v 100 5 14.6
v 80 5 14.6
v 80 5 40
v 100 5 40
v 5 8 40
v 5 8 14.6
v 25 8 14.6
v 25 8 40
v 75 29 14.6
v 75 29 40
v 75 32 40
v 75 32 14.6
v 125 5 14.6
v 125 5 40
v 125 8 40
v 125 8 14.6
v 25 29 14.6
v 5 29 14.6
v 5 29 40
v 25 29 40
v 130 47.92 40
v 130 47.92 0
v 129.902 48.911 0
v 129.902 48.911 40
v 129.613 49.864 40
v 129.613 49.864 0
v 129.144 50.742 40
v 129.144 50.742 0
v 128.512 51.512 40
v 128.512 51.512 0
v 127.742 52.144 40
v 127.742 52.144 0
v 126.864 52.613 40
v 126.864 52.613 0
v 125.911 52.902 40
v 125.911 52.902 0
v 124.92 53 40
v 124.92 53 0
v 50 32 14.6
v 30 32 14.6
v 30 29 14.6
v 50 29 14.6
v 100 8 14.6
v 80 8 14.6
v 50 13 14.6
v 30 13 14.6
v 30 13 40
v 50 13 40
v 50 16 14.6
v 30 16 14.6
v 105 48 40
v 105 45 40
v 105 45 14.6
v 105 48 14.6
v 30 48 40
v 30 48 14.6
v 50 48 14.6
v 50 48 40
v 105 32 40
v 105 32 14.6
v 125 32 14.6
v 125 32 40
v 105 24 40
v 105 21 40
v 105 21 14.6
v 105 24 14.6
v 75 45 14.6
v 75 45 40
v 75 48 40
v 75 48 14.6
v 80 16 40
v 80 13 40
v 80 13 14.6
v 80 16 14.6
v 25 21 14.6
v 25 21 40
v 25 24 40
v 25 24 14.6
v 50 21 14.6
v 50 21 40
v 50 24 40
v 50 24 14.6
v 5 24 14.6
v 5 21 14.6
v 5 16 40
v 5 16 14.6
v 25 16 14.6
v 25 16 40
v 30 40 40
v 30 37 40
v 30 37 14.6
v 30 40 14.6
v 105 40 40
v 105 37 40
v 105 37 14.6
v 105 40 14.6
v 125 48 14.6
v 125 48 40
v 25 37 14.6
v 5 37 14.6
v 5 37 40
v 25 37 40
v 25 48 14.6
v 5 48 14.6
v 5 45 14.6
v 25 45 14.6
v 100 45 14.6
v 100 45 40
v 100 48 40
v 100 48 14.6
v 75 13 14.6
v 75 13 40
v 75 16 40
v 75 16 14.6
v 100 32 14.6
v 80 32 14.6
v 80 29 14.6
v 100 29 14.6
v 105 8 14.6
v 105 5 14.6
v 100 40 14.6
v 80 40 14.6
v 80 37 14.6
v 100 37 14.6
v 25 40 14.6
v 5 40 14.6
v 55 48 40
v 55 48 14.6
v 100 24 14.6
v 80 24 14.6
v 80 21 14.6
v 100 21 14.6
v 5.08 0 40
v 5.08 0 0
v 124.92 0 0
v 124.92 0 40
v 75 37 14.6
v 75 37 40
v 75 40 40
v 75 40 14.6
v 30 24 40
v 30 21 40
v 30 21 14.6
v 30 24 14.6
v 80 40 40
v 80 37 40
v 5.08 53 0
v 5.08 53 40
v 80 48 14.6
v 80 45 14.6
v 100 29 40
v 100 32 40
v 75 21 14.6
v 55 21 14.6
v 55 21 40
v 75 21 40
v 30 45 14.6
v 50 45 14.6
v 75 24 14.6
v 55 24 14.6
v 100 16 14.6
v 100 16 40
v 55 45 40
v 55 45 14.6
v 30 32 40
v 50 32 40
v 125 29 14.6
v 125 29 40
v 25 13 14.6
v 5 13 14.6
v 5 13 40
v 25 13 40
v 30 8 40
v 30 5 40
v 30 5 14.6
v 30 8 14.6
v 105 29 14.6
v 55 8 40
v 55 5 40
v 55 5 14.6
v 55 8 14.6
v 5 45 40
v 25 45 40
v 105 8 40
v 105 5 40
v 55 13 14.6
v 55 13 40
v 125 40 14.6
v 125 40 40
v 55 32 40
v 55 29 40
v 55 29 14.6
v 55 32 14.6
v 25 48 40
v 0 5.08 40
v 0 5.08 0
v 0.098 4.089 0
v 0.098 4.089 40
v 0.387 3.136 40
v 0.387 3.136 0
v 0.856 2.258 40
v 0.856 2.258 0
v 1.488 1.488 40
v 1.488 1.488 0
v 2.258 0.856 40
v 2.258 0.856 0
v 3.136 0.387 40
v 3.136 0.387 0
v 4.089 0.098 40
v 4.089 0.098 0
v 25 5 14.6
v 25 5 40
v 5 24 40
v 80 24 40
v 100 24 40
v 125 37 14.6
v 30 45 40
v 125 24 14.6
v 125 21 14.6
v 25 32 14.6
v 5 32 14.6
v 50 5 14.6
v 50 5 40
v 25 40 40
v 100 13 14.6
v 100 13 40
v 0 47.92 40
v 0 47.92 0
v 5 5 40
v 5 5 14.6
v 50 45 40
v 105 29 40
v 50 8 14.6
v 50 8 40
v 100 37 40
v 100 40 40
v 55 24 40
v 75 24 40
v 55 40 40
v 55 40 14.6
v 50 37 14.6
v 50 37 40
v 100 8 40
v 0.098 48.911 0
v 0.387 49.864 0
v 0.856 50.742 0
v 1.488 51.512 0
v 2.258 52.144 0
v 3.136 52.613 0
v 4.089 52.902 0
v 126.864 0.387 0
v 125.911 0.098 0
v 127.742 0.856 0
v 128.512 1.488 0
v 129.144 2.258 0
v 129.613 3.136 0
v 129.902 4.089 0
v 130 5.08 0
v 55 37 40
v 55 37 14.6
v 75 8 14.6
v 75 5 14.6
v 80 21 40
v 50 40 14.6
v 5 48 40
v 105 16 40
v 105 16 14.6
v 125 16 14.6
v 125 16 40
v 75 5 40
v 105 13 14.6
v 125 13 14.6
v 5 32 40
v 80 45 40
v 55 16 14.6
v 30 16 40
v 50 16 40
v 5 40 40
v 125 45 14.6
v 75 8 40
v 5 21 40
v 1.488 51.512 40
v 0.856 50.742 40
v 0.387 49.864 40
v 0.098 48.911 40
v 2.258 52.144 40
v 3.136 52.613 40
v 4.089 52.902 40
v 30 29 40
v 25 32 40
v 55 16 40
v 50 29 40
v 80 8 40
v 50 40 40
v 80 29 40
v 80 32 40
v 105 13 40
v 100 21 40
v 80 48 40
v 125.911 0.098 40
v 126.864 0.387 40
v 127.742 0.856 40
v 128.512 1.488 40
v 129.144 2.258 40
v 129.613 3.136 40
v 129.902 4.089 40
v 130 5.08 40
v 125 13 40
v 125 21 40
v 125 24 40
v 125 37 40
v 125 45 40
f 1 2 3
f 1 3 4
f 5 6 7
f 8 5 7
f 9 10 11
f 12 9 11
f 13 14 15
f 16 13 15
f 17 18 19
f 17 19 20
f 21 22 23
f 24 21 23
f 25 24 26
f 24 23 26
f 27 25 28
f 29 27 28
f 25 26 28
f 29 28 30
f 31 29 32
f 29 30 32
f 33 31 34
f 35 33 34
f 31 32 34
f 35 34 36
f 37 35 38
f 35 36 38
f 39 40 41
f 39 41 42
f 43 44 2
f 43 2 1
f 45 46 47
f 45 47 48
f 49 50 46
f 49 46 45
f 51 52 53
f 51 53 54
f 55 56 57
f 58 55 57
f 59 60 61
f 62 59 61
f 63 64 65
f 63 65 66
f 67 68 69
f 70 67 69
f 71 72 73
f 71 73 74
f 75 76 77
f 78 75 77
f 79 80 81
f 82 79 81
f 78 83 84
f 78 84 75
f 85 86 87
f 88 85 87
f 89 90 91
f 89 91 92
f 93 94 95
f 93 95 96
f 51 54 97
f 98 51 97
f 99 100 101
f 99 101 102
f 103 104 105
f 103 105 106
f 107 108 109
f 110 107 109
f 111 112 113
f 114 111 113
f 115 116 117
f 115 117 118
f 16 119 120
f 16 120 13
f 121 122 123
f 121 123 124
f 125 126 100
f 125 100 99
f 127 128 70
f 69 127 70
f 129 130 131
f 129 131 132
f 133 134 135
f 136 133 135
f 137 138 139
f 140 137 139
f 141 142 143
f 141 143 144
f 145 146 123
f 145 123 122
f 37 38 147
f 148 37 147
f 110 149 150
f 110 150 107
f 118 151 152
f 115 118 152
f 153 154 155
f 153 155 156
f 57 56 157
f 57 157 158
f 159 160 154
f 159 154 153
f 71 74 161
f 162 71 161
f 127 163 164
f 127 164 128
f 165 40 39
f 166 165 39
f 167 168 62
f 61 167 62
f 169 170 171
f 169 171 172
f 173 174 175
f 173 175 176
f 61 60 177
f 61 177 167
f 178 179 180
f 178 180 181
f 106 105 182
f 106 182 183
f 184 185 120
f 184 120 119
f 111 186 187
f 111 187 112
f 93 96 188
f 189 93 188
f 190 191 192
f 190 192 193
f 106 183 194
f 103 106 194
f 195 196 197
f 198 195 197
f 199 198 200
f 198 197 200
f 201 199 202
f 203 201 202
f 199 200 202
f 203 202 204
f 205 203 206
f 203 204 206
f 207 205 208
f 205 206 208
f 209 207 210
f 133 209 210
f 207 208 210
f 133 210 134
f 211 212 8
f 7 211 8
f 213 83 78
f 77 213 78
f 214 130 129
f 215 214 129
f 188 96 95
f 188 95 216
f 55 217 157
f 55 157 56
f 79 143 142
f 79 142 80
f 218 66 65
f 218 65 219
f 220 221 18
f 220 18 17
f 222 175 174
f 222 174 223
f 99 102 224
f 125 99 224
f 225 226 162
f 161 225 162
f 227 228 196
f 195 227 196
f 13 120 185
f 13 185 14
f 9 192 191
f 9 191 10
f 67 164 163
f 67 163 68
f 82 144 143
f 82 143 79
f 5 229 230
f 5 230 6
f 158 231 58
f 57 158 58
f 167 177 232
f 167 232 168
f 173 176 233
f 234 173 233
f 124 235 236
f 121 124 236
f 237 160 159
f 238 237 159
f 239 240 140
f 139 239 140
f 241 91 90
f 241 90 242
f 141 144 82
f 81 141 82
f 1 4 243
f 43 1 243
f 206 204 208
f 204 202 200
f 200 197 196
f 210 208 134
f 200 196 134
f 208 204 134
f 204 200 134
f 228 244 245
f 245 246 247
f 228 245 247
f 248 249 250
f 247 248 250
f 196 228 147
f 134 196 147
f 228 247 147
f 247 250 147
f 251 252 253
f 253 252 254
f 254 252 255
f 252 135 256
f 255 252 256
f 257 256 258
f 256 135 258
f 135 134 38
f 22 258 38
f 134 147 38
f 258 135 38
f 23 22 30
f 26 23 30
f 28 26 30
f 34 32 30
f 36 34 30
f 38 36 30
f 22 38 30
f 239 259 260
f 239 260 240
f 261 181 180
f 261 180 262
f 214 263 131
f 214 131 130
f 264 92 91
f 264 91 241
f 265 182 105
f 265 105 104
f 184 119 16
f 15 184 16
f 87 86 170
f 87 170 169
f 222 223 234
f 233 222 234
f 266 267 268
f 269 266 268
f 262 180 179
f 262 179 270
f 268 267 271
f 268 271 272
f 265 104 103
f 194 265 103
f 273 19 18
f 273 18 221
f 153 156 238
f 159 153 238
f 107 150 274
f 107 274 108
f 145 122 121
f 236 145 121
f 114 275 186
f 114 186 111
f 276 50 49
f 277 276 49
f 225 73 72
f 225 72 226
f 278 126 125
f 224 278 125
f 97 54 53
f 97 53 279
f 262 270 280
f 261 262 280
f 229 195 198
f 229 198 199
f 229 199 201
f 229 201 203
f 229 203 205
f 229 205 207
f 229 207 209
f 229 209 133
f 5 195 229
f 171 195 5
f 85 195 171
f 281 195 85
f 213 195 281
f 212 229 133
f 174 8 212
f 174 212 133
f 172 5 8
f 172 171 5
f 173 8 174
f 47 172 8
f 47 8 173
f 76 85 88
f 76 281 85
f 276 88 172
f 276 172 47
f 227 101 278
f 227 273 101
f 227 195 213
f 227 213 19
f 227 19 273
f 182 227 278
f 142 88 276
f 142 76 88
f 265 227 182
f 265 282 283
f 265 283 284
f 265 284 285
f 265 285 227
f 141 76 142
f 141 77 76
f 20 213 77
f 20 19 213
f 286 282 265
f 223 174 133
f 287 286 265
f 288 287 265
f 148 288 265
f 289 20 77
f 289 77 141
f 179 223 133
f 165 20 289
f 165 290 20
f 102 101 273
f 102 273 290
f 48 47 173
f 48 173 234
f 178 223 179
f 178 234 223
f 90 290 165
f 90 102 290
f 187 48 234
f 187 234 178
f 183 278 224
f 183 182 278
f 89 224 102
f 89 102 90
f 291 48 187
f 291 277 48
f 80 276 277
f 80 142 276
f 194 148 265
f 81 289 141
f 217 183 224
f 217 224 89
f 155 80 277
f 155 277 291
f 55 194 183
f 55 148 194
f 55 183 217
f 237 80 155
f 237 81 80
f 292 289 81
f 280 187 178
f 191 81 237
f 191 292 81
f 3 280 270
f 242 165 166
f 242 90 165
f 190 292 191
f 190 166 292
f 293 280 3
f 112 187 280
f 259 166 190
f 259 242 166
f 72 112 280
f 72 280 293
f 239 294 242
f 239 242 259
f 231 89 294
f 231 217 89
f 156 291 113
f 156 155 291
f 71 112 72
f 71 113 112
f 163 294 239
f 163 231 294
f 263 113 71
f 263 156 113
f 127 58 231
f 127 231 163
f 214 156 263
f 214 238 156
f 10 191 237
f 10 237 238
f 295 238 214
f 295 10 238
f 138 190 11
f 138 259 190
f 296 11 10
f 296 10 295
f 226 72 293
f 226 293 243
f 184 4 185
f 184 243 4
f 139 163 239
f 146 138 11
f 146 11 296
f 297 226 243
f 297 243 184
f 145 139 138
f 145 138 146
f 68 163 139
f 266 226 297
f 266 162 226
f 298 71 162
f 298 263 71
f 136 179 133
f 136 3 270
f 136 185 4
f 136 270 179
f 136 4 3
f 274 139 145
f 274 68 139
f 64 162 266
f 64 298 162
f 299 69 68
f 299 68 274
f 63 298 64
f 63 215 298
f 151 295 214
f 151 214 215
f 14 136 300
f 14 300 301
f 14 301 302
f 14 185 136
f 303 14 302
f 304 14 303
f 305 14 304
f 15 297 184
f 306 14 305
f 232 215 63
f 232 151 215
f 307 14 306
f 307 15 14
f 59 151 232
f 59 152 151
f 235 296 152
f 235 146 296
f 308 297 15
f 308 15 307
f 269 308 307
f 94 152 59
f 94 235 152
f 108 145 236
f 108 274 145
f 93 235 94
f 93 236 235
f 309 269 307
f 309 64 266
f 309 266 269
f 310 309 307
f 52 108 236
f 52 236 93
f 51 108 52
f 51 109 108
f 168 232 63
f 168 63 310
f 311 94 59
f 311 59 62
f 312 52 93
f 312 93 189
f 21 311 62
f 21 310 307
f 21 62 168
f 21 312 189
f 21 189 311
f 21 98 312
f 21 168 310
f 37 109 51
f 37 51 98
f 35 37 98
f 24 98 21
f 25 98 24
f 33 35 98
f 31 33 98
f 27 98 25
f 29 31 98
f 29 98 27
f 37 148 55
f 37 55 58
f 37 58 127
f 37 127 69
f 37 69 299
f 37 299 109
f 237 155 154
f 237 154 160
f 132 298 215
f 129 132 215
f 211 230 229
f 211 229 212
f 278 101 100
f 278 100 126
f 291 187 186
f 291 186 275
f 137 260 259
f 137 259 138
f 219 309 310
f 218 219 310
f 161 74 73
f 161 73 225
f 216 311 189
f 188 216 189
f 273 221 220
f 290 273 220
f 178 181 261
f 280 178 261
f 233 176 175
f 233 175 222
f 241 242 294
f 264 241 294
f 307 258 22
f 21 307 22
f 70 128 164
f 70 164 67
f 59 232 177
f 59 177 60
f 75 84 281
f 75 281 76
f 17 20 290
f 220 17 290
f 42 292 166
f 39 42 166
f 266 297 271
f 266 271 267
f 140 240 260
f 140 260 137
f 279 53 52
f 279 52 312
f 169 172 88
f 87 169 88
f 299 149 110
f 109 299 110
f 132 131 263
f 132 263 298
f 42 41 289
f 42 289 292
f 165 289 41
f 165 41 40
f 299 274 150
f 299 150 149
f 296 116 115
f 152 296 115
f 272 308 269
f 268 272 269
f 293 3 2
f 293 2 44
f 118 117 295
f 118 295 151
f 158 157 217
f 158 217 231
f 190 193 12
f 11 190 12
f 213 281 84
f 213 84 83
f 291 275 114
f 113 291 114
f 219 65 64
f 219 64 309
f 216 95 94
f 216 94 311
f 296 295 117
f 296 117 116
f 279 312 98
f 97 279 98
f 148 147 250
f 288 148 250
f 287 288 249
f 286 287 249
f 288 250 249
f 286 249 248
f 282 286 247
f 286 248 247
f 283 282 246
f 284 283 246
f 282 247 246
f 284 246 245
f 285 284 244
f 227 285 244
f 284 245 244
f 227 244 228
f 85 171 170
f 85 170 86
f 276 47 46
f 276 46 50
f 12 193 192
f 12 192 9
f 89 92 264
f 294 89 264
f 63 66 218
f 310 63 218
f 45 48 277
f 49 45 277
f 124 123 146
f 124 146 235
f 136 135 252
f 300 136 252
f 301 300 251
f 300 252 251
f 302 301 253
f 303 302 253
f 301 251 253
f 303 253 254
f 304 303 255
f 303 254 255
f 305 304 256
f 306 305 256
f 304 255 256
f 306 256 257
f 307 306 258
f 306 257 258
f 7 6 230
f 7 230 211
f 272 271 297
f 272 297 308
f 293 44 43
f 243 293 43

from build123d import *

# Parameters (mm, degrees)
F1_DEPTH = 40
F2_W     = 20
F2_H     = 3
F3_DEPTH = 25.4


with BuildPart() as f1:
    # F0 (on Top) → F1 (new body)
    with BuildSketch(Plane.XY):
        with BuildLine():
            ThreePointArc((0, 5.08), (1.487898, 1.487898), (5.08, 0))
            Line((5.08, 0), (124.92, 0))
            ThreePointArc((124.92, 0), (128.512102, 1.487898), (130, 5.08))
            Line((130, 5.08), (130, 47.92))
            ThreePointArc((130, 47.92), (128.512102, 51.512102), (124.92, 53))
            Line((124.92, 53), (5.08, 53))
            ThreePointArc((5.08, 53), (1.487898, 51.512102), (0, 47.92))
            Line((0, 47.92), (0, 5.08))
        make_face()
    extrude(amount=F1_DEPTH)

    # F2 (on face) → F3 (cut)
    with BuildSketch(Plane.XY.offset(40)):
        with Locations((15, 46.5)):
            Rectangle(F2_W, F2_H)
        with Locations((15, 38.5)):
            Rectangle(F2_W, F2_H)
        with Locations((15, 30.5)):
            Rectangle(F2_W, F2_H)
        with Locations((15, 22.5)):
            Rectangle(F2_W, F2_H)
        with Locations((15, 14.5)):
            Rectangle(F2_W, F2_H)
        with Locations((15, 6.5)):
            Rectangle(F2_W, F2_H)
        with Locations((40, 46.5)):
            Rectangle(F2_W, F2_H)
        with Locations((40, 38.5)):
            Rectangle(F2_W, F2_H)
        with Locations((40, 30.5)):
            Rectangle(F2_W, F2_H)
        with Locations((40, 22.5)):
            Rectangle(F2_W, F2_H)
        with Locations((40, 14.5)):
            Rectangle(F2_W, F2_H)
        with Locations((40, 6.5)):
            Rectangle(F2_W, F2_H)
        with Locations((65, 46.5)):
            Rectangle(F2_W, F2_H)
        with Locations((65, 38.5)):
            Rectangle(F2_W, F2_H)
        with Locations((65, 30.5)):
            Rectangle(F2_W, F2_H)
        with Locations((65, 22.5)):
            Rectangle(F2_W, F2_H)
        with Locations((65, 14.5)):
            Rectangle(F2_W, F2_H)
        with Locations((65, 6.5)):
            Rectangle(F2_W, F2_H)
        with Locations((90, 46.5)):
            Rectangle(F2_W, F2_H)
        with Locations((90, 38.5)):
            Rectangle(F2_W, F2_H)
        with Locations((90, 30.5)):
            Rectangle(F2_W, F2_H)
        with Locations((90, 22.5)):
            Rectangle(F2_W, F2_H)
        with Locations((90, 14.5)):
            Rectangle(F2_W, F2_H)
        with Locations((90, 6.5)):
            Rectangle(F2_W, F2_H)
        with Locations((115, 46.5)):
            Rectangle(F2_W, F2_H)
        with Locations((115, 38.5)):
            Rectangle(F2_W, F2_H)
        with Locations((115, 30.5)):
            Rectangle(F2_W, F2_H)
        with Locations((115, 22.5)):
            Rectangle(F2_W, F2_H)
        with Locations((115, 14.5)):
            Rectangle(F2_W, F2_H)
        with Locations((115, 6.5)):
            Rectangle(F2_W, F2_H)
    extrude(amount=-F3_DEPTH, mode=Mode.SUBTRACT)


solid = f1.part
